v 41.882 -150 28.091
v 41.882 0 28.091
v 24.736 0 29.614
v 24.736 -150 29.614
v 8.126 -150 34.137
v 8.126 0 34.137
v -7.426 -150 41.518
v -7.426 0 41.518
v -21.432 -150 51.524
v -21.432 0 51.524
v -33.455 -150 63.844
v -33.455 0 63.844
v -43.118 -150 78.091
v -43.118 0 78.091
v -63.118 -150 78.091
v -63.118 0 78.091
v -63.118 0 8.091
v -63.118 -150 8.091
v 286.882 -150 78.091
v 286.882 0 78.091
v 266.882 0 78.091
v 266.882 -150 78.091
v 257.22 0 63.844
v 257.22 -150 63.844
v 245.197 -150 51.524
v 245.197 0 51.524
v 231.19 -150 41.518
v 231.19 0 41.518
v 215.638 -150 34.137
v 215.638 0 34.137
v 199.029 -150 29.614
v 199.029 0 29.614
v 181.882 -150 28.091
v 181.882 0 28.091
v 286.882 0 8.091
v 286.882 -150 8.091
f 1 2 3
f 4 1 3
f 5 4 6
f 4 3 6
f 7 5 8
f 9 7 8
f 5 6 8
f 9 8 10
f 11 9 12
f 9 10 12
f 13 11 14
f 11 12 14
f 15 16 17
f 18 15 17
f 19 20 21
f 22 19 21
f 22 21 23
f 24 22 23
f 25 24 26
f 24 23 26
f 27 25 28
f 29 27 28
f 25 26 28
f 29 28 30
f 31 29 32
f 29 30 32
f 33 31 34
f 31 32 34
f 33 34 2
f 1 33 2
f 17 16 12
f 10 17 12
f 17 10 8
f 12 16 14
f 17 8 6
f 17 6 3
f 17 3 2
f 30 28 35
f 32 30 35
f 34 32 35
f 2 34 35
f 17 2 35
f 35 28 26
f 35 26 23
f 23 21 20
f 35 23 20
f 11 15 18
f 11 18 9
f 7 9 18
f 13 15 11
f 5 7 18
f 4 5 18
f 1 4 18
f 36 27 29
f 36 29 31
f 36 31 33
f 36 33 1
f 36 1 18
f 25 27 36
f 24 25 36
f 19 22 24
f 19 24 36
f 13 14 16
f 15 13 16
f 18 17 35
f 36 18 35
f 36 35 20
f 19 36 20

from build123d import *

# Parameters (mm, degrees)
F1_DEPTH = 150


with BuildPart() as f1:
    # F0 (on Front) → F1 (new body)
    with BuildSketch(Plane.XZ):
        with BuildLine():
            Line((-43.11781, 78.090709), (-63.11781, 78.090709))
            Line((-63.11781, 78.090709), (-63.11781, 8.090709))
            Line((-63.11781, 8.090709), (286.88219, 8.090709))
            Line((286.88219, 8.090709), (286.88219, 78.090709))
            Line((286.88219, 78.090709), (266.88219, 78.090709))
            ThreePointArc((266.88219, 78.090709), (231.189898, 41.517607), (181.88219, 28.090709))
            Line((181.88219, 28.090709), (111.88219, 28.090709))
            Line((111.88219, 28.090709), (41.88219, 28.090709))
            ThreePointArc((41.88219, 28.090709), (-7.425517, 41.517607), (-43.11781, 78.090709))
        make_face()
    extrude(amount=F1_DEPTH)


solid = f1.part
